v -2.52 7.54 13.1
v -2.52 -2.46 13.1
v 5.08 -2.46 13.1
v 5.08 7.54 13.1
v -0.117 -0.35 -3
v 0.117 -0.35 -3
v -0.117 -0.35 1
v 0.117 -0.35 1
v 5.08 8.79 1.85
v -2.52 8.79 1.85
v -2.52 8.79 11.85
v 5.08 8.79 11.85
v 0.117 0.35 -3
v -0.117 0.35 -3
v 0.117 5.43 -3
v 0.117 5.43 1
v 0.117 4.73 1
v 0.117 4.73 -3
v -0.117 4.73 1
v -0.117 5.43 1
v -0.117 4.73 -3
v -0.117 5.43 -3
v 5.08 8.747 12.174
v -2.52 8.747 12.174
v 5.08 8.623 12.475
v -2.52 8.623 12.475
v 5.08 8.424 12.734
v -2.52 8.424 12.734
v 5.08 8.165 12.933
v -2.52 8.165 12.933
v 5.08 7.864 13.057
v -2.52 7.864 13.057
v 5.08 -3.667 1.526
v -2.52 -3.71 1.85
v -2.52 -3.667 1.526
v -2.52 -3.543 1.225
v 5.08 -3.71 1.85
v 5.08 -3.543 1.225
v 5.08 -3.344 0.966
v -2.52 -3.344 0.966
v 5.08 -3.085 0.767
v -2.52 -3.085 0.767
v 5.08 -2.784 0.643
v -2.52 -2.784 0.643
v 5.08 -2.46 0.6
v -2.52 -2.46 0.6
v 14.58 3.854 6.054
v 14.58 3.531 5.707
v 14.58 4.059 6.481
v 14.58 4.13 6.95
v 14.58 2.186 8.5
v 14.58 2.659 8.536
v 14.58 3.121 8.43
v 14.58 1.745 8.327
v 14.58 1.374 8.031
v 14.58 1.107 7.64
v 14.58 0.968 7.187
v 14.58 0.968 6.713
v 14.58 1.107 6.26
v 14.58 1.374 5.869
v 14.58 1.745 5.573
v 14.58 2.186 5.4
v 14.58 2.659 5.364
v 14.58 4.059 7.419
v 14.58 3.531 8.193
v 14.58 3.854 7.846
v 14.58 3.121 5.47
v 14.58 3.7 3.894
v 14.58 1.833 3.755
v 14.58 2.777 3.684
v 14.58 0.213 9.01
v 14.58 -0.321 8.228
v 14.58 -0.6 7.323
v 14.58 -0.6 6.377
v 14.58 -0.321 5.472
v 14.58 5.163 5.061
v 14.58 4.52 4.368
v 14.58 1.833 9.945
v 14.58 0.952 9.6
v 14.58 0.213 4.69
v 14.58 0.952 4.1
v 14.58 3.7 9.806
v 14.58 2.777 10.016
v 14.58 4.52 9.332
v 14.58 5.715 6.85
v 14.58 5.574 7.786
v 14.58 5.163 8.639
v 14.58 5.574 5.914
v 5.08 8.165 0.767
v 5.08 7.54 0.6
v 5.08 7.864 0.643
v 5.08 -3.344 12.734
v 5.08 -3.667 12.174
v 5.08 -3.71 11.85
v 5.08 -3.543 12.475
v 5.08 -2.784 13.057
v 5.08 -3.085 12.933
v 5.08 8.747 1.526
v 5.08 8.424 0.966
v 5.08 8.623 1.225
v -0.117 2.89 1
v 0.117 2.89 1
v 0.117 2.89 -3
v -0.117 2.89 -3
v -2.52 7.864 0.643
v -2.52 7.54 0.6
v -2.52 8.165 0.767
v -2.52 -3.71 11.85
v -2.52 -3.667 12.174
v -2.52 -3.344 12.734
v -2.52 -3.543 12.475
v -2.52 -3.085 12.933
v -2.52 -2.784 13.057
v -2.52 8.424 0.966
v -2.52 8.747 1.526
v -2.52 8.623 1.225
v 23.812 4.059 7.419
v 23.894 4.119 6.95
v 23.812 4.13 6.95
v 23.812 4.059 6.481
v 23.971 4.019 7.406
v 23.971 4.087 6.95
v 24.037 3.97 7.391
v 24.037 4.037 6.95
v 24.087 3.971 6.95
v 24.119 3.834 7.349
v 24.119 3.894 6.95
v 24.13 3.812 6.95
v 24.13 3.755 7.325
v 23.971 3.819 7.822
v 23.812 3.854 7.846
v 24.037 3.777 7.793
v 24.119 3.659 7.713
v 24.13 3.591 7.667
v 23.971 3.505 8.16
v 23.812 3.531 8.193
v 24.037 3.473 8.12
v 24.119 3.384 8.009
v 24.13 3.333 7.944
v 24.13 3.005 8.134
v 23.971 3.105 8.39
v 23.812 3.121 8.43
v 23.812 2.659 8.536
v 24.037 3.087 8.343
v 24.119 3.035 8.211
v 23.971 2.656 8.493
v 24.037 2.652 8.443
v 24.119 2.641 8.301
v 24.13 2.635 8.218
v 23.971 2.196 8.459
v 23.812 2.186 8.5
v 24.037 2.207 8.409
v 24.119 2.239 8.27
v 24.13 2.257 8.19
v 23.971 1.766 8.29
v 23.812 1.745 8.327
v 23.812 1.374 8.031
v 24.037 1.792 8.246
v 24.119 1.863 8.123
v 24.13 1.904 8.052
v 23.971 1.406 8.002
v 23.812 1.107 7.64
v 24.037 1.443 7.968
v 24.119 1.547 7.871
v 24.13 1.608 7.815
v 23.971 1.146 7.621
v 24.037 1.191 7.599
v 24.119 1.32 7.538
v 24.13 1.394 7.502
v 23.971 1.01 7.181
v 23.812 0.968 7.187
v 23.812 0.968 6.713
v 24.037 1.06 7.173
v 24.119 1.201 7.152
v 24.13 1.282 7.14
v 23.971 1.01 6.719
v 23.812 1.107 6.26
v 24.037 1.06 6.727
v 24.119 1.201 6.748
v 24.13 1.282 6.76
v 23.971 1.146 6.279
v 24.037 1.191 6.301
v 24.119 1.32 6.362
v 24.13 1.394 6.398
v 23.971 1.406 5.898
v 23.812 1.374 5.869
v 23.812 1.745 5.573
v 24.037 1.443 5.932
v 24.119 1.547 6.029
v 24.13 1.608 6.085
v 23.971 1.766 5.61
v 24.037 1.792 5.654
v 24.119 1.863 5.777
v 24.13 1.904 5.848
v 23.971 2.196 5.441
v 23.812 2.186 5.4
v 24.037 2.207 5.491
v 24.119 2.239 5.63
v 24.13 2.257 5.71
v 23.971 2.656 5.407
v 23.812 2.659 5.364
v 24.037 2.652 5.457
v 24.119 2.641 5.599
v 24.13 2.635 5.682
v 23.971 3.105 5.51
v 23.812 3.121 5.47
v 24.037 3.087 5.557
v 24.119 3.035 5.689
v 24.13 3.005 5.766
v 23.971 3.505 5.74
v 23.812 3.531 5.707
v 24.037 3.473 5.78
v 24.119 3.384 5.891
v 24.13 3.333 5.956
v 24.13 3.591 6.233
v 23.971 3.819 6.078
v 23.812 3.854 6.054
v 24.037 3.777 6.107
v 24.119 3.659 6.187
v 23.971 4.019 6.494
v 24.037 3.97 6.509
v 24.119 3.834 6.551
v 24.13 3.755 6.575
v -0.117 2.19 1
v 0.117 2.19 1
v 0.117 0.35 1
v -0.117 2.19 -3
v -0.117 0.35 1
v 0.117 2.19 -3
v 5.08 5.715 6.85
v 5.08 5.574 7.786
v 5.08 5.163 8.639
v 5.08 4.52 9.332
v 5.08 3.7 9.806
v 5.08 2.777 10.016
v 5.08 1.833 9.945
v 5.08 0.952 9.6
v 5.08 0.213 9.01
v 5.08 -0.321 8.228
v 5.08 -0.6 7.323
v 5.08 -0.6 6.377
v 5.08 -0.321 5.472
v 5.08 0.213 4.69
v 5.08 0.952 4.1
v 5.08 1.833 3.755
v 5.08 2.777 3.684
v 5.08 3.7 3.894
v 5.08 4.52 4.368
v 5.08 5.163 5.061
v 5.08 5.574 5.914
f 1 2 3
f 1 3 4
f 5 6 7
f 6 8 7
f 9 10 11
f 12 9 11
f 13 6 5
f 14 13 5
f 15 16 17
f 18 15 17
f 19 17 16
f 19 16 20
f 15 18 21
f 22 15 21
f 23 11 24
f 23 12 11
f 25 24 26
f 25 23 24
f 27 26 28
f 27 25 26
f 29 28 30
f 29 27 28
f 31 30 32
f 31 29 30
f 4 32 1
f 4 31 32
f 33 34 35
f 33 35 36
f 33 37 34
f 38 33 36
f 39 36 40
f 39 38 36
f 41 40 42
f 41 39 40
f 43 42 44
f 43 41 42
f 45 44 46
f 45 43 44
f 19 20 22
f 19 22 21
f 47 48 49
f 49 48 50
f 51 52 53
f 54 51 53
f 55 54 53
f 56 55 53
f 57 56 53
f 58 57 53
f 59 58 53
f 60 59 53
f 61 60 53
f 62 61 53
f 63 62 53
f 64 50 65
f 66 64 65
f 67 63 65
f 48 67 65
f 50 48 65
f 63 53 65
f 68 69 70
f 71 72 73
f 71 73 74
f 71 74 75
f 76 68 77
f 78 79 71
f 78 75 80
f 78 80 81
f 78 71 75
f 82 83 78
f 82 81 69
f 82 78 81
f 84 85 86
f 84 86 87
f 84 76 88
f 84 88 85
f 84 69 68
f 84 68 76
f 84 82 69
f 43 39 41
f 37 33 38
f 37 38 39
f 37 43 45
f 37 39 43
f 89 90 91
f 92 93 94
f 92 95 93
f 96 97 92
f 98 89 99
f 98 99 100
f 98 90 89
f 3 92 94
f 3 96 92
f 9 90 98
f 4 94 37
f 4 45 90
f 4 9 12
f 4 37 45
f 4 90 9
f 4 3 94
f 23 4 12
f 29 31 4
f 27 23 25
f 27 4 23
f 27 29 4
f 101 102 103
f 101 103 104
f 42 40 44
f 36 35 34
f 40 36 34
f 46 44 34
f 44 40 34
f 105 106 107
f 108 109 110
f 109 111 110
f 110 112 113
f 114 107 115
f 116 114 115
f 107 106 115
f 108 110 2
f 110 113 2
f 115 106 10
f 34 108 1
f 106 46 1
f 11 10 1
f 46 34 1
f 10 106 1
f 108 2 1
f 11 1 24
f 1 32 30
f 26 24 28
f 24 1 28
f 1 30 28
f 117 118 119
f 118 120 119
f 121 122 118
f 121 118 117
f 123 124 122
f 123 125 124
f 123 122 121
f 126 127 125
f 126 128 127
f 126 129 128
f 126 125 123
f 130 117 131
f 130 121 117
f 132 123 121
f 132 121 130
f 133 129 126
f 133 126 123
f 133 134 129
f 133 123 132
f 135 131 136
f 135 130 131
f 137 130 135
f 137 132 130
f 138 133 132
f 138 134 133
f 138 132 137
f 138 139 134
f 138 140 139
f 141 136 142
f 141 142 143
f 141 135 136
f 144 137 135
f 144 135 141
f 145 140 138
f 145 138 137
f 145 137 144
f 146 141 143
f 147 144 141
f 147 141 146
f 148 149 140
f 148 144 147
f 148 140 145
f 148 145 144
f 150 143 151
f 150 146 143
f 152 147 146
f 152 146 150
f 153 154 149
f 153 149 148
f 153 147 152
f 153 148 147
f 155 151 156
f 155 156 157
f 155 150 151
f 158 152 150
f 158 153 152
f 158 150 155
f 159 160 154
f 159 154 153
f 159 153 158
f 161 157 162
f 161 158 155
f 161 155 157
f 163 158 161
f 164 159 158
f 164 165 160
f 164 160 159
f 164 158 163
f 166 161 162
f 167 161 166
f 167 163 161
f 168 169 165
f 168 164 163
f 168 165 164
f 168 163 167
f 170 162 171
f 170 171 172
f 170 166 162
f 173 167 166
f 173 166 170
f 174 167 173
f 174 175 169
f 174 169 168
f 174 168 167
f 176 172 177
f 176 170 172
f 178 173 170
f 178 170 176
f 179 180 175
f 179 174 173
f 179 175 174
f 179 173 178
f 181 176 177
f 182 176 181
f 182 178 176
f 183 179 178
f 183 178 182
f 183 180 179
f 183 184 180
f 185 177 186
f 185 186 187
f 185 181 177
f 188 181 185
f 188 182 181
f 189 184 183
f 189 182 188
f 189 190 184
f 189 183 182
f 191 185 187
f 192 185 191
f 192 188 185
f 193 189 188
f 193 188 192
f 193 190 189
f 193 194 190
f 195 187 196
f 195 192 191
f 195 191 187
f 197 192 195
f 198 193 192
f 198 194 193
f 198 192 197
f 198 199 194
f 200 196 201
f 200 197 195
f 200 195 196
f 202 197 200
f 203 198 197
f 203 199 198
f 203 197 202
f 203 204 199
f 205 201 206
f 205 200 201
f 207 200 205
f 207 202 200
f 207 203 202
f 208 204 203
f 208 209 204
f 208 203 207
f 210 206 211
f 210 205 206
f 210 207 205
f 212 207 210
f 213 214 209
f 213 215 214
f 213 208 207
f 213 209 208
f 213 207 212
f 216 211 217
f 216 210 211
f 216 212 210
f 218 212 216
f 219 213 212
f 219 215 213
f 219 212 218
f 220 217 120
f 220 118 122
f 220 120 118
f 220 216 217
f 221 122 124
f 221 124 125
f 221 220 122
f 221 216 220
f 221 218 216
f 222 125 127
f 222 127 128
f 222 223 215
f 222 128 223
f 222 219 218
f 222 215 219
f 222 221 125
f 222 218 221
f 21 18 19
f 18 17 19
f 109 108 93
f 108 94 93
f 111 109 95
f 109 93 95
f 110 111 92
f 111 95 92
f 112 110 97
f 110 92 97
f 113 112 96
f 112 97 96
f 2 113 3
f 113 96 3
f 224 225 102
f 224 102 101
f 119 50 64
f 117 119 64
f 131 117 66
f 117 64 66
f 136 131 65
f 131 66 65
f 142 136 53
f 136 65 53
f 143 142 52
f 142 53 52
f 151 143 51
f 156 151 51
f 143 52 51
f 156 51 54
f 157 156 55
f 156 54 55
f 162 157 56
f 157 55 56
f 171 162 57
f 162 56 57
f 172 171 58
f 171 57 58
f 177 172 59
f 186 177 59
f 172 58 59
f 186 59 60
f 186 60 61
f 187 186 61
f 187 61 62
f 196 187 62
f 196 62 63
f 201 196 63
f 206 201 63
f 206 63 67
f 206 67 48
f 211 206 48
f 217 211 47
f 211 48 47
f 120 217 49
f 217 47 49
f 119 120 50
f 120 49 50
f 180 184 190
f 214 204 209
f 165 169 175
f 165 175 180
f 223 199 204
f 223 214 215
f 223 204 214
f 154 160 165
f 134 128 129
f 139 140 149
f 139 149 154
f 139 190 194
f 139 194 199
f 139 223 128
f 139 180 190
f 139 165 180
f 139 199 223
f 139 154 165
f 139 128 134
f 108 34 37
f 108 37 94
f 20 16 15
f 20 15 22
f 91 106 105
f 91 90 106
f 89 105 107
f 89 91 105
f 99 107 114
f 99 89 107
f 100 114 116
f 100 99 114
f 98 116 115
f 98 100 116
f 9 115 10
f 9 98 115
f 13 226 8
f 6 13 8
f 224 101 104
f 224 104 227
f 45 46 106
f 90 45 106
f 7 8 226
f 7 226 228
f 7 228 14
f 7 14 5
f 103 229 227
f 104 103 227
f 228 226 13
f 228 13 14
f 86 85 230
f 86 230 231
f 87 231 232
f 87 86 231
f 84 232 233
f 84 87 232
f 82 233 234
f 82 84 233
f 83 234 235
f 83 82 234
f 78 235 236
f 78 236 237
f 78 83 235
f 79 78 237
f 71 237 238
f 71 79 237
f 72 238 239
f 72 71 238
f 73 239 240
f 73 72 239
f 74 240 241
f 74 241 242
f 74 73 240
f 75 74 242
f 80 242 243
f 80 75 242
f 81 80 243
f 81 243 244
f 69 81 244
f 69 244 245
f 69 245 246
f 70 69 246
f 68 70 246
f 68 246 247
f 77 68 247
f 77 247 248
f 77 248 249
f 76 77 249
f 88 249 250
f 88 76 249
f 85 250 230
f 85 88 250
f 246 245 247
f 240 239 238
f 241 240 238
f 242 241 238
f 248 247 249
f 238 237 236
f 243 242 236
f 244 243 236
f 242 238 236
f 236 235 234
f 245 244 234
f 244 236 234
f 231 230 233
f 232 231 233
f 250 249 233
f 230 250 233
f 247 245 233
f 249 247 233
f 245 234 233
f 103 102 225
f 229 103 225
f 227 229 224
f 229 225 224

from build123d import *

# Parameters (mm, degrees)
SKETCH001_R       = 3.175
PAD001_DEPTH      = 9.5
SKETCH003_W       = 0.233334
SKETCH003_H       = 0.7
PAD002_DEPTH      = 1
PAD002_DEPTH_BACK = 3
SKETCH004_R       = 1.59
PAD003_DEPTH      = 9.55
FILLET_R          = 0.318
SKETCH_W          = 12.5
SKETCH_H          = 12.5
PAD_DEPTH         = 7.6
FILLET001_R       = 1.25


with BuildPart() as pad001:
    # Sketch001 → Pad001 (new body)
    with BuildSketch(Plane.YZ.offset(14.58)):
        with Locations((2.54, 6.85)):
            Circle(SKETCH001_R)
    extrude(amount=-PAD001_DEPTH)


with BuildPart() as pad002:
    # Sketch003 → Pad002 (new body, two sides)
    with BuildSketch(Plane(origin=(0, 0, 0), x_dir=(-1, 0, 0), z_dir=(0, 0, 1))) as pad002_sk:
        Rectangle(SKETCH003_W, SKETCH003_H)
        with Locations((0, -2.54)):
            Rectangle(SKETCH003_W, SKETCH003_H)
        with Locations((0, -5.08)):
            Rectangle(SKETCH003_W, SKETCH003_H)
    extrude(amount=PAD002_DEPTH)
    extrude(pad002_sk.sketch, amount=-PAD002_DEPTH_BACK)


with BuildPart() as fillet_body:
    # Sketch004 → Pad003 (new body)
    with BuildSketch(Plane.YZ.offset(14.58)):
        with Locations((2.54, 6.95)):
            Circle(SKETCH004_R)
    extrude(amount=PAD003_DEPTH)

    # Fillet
    fillet_edges = [fillet_body.edges().sort_by_distance(p)[0] for p in [
        (24.13, 0.95, 6.95),
    ]]
    fillet(fillet_edges, radius=FILLET_R)


with BuildPart() as fillet001:
    # Sketch → Pad (new body)
    with BuildSketch(Plane.YZ.offset(-2.52)):
        with Locations((2.54, 6.85)):
            Rectangle(SKETCH_W, SKETCH_H)
    extrude(amount=PAD_DEPTH)

    # Fillet001
    fillet001_edges = [fillet001.edges().sort_by_distance(p)[0] for p in [
        (1.28, -3.71, 13.1),
        (1.28, 8.79, 13.1),
        (1.28, -3.71, 0.6),
        (1.28, 8.79, 0.6),
    ]]
    fillet(fillet001_edges, radius=FILLET001_R)


solid = Compound([pad001.part, pad002.part, fillet_body.part, fillet001.part])
